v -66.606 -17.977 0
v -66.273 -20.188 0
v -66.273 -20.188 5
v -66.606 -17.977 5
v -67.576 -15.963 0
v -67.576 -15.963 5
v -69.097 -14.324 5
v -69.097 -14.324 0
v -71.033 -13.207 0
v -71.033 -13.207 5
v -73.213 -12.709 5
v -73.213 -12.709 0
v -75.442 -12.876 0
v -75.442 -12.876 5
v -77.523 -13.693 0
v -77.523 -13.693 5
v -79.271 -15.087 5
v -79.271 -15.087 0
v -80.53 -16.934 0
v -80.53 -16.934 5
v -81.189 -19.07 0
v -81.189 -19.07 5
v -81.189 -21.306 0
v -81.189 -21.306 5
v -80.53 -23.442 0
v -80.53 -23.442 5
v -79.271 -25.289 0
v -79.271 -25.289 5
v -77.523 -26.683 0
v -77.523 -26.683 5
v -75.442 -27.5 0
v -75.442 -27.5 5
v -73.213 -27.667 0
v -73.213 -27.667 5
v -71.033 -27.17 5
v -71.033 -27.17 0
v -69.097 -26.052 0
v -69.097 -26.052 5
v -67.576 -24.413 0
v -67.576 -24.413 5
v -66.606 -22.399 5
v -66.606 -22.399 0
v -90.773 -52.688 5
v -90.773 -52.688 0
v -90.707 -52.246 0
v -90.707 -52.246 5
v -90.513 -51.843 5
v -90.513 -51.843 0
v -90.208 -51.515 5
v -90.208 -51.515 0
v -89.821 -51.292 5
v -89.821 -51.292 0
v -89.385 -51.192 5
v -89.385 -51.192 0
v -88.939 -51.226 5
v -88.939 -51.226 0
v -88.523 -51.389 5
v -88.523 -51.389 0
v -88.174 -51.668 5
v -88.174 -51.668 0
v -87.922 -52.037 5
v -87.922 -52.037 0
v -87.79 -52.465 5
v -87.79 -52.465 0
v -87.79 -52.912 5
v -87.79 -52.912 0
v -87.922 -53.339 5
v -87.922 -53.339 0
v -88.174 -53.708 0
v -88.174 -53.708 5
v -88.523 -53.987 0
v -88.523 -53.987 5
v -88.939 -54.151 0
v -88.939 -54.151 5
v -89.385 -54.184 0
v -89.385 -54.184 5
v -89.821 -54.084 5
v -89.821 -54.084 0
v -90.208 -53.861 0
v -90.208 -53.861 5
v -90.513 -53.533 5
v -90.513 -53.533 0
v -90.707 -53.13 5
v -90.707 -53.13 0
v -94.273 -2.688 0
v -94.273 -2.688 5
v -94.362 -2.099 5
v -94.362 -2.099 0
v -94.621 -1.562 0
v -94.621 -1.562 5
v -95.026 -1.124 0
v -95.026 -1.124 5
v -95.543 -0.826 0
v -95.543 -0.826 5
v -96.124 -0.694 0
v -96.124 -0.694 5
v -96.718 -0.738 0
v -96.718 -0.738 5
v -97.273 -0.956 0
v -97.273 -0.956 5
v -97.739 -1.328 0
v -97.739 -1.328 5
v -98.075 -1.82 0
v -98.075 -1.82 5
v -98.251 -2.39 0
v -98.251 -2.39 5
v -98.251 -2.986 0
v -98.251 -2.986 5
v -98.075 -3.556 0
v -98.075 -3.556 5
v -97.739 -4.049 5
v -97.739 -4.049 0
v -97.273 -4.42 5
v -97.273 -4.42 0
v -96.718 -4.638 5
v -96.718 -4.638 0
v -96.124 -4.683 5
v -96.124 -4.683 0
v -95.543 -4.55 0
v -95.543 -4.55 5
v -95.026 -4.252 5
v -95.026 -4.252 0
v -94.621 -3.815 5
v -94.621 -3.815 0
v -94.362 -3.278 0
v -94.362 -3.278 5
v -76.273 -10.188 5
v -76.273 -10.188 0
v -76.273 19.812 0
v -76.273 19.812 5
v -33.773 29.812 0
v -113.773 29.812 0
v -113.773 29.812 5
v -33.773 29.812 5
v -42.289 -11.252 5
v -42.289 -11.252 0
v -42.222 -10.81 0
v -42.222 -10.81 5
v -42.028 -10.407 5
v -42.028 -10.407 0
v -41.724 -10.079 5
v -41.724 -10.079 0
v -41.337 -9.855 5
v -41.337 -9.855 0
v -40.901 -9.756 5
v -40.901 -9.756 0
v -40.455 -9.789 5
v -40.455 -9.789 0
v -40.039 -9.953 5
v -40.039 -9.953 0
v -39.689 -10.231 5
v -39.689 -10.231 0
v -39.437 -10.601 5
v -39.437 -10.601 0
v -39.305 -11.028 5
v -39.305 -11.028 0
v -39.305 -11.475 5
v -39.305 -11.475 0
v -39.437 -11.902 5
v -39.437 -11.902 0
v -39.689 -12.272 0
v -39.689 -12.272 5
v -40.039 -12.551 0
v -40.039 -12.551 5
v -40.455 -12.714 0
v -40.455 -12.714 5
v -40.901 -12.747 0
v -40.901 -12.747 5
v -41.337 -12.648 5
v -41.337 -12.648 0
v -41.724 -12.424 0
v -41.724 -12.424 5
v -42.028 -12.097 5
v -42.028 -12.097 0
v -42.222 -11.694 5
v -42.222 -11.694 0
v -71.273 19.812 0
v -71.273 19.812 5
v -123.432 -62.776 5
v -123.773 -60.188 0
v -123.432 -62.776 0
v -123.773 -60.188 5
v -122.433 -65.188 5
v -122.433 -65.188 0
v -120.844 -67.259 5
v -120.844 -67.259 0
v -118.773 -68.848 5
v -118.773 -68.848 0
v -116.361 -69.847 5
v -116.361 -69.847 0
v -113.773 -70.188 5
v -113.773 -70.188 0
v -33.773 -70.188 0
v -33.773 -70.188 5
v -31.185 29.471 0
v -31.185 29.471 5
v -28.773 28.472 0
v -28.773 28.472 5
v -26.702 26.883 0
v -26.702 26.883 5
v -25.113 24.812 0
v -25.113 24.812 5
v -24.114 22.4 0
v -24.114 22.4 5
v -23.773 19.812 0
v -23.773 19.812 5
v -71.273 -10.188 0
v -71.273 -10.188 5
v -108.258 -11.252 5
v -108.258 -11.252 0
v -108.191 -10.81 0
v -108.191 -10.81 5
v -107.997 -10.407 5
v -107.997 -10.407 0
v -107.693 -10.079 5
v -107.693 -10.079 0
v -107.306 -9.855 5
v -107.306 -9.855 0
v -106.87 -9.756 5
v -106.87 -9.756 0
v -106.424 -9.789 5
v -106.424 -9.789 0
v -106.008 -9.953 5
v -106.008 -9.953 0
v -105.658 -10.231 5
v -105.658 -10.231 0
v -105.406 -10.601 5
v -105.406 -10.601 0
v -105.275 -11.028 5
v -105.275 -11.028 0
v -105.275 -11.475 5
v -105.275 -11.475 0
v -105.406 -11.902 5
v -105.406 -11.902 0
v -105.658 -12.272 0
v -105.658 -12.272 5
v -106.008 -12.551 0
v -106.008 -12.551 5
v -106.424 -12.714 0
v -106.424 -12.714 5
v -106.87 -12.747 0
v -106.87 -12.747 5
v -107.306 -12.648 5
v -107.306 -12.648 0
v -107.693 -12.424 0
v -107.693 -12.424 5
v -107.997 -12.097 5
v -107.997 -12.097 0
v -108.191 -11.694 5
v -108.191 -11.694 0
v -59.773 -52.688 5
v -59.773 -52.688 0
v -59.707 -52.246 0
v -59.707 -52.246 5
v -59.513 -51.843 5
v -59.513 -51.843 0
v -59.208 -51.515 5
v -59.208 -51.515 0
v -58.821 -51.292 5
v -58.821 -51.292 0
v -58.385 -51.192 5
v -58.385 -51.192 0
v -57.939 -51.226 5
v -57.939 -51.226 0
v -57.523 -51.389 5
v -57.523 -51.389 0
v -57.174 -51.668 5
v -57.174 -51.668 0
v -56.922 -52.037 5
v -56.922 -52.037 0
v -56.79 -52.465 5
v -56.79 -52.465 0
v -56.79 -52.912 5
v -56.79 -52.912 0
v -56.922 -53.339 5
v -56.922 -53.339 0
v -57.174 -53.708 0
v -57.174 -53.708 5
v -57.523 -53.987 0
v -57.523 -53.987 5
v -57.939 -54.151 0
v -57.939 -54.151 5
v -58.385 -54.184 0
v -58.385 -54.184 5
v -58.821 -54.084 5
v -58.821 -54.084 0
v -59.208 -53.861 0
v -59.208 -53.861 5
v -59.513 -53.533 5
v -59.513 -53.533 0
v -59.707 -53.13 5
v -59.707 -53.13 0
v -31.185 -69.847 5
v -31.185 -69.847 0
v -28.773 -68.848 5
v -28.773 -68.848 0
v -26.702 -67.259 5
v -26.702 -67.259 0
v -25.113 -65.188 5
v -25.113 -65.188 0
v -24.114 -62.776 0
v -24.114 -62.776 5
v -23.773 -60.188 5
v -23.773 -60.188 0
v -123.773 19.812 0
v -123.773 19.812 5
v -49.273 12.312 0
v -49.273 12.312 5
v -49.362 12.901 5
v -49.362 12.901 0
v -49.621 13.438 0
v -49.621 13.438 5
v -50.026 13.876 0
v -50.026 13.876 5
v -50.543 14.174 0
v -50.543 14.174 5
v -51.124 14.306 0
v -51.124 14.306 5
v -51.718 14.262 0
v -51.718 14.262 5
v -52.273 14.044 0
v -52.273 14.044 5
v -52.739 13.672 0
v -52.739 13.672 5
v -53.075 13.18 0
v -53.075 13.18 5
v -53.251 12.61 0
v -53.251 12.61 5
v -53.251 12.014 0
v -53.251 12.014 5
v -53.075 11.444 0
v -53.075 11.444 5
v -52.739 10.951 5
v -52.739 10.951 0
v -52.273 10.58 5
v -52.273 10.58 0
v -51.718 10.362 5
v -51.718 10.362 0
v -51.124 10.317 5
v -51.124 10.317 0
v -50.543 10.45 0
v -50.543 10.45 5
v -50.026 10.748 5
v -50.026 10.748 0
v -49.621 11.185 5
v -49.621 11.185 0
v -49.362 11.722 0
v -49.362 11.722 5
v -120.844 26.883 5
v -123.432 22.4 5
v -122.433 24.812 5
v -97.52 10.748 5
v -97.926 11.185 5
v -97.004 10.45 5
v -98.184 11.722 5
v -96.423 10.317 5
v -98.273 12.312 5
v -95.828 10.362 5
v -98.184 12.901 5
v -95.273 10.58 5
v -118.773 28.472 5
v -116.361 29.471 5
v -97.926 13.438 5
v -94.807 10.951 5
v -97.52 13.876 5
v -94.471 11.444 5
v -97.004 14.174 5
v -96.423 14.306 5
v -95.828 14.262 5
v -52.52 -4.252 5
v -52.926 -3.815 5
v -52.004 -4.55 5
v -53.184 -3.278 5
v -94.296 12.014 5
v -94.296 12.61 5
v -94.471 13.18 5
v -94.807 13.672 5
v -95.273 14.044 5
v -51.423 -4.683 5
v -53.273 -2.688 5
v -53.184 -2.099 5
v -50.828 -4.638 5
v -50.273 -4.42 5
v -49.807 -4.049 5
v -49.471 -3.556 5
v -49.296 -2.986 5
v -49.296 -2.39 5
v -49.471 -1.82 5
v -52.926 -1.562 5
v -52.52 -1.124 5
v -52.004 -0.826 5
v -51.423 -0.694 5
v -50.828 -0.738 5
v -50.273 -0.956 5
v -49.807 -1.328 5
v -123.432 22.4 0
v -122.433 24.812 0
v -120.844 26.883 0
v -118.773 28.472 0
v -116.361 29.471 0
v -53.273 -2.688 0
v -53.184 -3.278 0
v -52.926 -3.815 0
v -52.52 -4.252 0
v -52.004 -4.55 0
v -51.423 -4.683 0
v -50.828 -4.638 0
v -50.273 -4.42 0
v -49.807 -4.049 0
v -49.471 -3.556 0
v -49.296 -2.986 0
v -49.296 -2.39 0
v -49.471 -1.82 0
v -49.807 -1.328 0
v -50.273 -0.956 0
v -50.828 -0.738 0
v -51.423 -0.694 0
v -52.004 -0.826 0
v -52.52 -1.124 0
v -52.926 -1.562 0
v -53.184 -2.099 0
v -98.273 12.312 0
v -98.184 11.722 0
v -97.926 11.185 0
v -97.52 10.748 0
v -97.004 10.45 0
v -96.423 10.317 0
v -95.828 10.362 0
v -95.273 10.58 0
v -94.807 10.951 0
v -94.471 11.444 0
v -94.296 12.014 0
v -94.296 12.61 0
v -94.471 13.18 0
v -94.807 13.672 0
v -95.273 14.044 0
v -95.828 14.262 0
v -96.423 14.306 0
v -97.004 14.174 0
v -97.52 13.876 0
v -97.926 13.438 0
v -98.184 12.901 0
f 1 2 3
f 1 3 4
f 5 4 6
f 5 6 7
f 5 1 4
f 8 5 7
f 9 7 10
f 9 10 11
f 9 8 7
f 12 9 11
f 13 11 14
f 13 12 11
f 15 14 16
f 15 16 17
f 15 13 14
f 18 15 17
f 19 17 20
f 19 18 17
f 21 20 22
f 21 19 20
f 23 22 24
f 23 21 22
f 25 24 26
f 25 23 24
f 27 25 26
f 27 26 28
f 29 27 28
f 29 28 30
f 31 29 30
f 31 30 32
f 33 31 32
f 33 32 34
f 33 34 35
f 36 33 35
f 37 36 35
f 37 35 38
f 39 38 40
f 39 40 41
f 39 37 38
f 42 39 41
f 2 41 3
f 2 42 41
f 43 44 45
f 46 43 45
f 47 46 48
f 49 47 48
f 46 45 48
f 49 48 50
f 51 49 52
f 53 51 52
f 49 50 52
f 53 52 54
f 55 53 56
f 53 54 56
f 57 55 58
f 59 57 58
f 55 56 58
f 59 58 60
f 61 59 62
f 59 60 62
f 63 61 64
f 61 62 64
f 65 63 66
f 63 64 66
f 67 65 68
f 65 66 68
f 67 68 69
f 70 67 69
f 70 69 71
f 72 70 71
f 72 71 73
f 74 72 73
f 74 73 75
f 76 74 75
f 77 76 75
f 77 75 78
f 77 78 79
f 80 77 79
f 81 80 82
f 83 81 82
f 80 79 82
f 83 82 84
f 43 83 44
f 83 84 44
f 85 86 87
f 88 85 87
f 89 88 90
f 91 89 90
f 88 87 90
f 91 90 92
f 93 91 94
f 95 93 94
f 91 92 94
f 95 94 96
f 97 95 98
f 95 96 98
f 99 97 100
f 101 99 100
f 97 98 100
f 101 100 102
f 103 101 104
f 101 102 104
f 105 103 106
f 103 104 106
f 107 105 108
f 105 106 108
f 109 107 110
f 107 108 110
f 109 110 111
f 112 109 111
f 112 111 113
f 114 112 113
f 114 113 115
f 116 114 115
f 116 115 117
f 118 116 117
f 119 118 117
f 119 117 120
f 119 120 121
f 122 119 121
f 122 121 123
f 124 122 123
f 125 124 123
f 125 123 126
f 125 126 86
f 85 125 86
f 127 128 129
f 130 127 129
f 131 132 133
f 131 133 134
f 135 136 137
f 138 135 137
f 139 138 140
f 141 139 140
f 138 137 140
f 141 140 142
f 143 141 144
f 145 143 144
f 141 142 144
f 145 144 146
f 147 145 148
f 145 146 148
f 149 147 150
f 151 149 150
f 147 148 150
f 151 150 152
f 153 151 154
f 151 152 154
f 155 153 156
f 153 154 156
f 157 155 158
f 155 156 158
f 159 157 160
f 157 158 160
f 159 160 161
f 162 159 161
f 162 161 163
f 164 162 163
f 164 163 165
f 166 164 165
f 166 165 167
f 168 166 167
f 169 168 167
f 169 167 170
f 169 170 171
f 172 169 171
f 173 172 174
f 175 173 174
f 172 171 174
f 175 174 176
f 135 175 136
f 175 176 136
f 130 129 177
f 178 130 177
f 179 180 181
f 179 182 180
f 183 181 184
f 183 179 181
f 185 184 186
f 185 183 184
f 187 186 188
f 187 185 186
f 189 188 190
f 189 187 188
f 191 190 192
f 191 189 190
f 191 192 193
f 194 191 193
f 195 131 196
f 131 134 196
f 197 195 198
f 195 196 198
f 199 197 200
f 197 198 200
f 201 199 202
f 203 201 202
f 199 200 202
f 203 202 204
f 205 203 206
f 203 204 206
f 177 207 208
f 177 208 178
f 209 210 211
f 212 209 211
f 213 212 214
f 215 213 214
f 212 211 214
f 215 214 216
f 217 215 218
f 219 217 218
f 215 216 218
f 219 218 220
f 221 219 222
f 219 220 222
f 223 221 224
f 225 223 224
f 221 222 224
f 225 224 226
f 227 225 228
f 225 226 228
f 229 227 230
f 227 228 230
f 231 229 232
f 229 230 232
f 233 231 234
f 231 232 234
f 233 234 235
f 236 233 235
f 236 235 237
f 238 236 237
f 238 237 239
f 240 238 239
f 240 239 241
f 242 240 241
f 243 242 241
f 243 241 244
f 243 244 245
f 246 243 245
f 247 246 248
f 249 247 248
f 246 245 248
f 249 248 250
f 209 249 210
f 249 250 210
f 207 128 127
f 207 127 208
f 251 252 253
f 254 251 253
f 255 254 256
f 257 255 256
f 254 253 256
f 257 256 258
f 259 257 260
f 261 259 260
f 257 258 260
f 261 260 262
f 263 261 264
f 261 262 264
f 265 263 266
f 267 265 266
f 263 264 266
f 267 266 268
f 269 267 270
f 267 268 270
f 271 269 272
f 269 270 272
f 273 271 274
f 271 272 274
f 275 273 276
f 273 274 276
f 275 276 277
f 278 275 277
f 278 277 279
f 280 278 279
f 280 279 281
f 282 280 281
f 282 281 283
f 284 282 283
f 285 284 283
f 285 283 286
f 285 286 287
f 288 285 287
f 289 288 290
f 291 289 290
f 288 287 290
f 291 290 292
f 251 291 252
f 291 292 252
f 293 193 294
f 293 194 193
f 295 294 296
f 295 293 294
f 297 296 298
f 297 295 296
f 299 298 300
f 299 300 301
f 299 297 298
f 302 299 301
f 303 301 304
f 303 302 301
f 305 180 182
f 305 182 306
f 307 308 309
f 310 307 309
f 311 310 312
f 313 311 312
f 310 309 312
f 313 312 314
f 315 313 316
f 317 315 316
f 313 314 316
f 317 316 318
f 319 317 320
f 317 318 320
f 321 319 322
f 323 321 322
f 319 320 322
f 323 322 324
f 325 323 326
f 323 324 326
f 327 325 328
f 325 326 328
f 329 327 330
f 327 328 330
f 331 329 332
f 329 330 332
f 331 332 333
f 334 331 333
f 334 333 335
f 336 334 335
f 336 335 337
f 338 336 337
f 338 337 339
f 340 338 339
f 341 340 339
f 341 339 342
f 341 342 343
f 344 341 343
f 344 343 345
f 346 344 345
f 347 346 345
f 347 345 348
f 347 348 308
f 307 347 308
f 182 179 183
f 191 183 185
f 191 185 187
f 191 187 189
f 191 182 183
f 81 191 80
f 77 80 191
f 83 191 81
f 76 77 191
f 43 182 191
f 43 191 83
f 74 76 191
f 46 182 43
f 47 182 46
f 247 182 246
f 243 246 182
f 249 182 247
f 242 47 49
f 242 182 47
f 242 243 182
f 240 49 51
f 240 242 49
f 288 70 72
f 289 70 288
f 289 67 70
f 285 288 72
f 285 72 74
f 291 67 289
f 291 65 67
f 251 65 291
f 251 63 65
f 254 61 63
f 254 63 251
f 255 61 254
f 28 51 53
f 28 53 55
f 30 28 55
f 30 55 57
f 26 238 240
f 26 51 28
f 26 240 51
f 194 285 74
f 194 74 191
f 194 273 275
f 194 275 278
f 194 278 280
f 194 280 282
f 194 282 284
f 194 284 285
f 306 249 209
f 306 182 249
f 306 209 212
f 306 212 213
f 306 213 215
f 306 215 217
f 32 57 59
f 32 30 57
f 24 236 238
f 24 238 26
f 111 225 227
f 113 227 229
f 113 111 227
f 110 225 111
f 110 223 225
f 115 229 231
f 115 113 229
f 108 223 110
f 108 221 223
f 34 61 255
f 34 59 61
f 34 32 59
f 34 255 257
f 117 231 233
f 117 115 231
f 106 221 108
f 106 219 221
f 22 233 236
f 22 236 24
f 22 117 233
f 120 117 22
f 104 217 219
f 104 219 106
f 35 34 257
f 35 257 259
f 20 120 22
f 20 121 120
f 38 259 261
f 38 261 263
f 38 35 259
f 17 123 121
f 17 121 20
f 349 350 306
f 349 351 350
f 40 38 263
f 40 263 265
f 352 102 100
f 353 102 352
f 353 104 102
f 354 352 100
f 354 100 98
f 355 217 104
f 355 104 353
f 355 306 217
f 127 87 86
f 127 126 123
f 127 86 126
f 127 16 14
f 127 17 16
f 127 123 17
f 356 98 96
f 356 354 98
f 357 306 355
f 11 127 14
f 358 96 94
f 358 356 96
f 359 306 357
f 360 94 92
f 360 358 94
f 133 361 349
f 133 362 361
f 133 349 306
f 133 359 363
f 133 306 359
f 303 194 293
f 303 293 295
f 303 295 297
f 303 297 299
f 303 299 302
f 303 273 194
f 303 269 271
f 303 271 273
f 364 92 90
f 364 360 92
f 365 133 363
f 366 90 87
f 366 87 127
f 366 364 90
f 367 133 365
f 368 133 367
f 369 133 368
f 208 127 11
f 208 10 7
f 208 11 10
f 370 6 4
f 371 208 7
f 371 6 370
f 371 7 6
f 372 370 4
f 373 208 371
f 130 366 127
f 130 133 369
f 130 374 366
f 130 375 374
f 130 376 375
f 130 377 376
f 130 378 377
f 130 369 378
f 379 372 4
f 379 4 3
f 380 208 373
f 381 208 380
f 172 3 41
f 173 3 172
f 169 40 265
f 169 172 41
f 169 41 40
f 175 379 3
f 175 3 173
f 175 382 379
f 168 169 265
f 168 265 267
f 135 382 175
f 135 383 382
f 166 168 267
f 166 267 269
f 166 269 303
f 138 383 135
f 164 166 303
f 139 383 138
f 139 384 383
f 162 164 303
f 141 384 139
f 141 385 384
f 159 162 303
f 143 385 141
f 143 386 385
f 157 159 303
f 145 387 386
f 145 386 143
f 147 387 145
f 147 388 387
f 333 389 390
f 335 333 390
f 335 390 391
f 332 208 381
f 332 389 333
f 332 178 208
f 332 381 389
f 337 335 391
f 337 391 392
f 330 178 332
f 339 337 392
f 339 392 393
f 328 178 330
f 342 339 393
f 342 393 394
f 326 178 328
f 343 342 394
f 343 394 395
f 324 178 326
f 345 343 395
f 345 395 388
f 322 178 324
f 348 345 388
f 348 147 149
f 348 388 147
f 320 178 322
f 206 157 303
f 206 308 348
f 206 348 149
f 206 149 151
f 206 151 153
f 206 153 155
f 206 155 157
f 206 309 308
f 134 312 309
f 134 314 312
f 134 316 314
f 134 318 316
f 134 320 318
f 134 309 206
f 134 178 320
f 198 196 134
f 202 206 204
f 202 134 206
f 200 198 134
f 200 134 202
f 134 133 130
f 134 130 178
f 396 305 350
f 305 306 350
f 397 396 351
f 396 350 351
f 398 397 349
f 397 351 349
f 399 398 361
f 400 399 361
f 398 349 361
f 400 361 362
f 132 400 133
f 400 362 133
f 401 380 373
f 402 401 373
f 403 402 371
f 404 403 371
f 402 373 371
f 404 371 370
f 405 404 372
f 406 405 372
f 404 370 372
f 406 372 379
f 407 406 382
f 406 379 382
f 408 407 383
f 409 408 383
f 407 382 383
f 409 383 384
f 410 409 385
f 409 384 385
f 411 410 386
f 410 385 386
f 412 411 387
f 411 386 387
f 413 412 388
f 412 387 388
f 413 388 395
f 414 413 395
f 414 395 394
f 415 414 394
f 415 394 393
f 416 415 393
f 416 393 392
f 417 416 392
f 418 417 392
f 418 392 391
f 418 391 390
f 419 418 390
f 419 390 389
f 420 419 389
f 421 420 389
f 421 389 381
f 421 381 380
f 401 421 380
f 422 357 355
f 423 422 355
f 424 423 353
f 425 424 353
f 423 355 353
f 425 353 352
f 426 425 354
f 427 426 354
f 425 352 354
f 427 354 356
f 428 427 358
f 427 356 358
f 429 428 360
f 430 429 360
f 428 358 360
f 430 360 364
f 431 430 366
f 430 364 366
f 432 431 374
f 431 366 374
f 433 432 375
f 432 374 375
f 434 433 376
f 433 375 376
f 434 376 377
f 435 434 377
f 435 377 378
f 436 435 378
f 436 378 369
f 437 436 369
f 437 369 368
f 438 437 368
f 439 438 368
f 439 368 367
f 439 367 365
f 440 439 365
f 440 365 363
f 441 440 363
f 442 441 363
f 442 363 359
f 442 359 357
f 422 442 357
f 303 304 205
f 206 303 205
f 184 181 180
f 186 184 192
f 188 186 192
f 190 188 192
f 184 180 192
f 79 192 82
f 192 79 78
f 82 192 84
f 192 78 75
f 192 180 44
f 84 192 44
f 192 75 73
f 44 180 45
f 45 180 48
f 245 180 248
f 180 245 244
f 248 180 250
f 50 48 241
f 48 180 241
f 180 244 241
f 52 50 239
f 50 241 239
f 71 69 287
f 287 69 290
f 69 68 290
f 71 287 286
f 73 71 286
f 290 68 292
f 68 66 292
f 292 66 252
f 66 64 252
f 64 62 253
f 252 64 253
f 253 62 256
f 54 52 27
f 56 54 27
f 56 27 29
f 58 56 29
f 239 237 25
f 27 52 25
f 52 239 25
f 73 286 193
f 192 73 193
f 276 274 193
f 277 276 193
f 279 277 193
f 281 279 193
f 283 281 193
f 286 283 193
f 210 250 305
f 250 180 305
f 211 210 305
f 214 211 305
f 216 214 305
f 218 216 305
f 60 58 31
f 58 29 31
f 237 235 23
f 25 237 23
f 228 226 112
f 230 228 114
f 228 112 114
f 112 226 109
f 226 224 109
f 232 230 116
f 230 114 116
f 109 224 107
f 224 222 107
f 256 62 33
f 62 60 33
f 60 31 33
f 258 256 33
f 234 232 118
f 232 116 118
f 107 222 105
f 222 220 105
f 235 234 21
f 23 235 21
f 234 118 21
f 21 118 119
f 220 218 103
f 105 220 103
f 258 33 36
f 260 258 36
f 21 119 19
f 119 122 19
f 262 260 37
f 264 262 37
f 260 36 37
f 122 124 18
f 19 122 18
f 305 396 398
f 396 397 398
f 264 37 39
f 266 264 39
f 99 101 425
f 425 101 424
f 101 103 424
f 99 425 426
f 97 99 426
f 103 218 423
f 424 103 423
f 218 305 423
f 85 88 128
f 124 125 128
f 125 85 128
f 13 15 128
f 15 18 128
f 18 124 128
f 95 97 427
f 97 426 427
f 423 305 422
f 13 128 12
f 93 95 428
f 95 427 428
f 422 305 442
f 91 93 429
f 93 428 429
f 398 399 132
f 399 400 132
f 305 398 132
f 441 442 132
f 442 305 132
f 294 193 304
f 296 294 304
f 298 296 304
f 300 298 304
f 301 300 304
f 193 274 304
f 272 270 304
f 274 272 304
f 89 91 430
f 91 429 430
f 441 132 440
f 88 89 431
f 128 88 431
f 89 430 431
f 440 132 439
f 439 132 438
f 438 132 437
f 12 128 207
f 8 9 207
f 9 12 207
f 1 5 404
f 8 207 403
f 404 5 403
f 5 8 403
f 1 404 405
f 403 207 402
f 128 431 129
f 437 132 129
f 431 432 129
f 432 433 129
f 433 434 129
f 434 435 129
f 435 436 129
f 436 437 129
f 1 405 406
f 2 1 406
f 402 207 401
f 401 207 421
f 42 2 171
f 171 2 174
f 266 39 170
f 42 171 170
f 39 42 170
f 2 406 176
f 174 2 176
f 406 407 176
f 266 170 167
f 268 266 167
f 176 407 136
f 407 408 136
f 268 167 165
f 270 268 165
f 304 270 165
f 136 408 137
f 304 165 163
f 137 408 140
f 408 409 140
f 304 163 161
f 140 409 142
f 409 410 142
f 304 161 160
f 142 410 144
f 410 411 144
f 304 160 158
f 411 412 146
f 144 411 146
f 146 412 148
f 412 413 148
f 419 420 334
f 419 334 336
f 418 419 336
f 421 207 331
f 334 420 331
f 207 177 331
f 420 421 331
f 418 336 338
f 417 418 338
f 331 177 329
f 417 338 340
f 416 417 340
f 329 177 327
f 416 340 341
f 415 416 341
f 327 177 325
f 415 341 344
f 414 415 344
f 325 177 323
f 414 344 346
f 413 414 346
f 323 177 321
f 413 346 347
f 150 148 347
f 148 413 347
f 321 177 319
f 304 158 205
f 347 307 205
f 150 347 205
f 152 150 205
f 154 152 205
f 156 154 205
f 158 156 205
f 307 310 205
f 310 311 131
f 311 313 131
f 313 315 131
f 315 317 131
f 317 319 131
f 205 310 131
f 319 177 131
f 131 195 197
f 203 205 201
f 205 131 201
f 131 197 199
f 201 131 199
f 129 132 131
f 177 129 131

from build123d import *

# Parameters (mm, degrees)
CROQUIS1_W              = 100
CROQUIS1_H              = 100
CROQUIS1_R              = 7.5
CROQUIS1_W_2            = 5
CROQUIS1_H_2            = 30
SALIENTE_EXTRUIR1_DEPTH = 5
REDONDEO1_R             = 10
CROQUIS3_R              = 1.5
CROQUIS3_R_2            = 1.500000006
CORTAR_EXTRUIR1_DEPTH   = 5
CORTAR_EXTRUIR2_REACH   = 144.377
CROQUIS4_R              = 2


with BuildPart() as part:
    # Croquis1 → Saliente-Extruir1 (new body)
    with BuildSketch(Plane.XY):
        with Locations((-73.773233416, -20.188160544)):
            Rectangle(CROQUIS1_W, CROQUIS1_H)
        with Locations((-73.773233416, -20.188160544)):
            Circle(CROQUIS1_R, mode=Mode.SUBTRACT)
        with Locations((-73.773233416, 4.811839456)):
            Rectangle(CROQUIS1_W_2, CROQUIS1_H_2, mode=Mode.SUBTRACT)
    extrude(amount=SALIENTE_EXTRUIR1_DEPTH)

    # Redondeo1
    redondeo1_edges = [part.edges().sort_by_distance(p)[0] for p in [
        (-23.773233416, 29.811839456, 2.5),
        (-23.773233416, -70.188160544, 2.5),
        (-123.773233416, -70.188160544, 2.5),
        (-123.773233416, 29.811839456, 2.5),
    ]]
    fillet(redondeo1_edges, radius=REDONDEO1_R)

    # Croquis3 → Cortar-Extruir1 (cut)
    with BuildSketch(Plane(origin=(0, 0, 0), x_dir=(-1, 0, 0), z_dir=(0, 0, -1))):
        with Locations((106.757827558, -11.251647632)):
            Circle(CROQUIS3_R)
        with Locations((40.788639233, -11.251647632)):
            Circle(CROQUIS3_R_2)
        with Locations((89.273233395, -52.688161005)):
            Circle(CROQUIS3_R)
        with Locations((58.273233395, -52.688161005)):
            Circle(CROQUIS3_R)
    extrude(amount=-CORTAR_EXTRUIR1_DEPTH, mode=Mode.SUBTRACT)

    # Croquis4 → Cortar-Extruir2 (cut, up to next)
    with BuildSketch(Plane.XY.offset(5), mode=Mode.PRIVATE) as cortar_extruir2_sk1:
        with Locations((-51.273233416, 12.311839456)):
            Circle(CROQUIS4_R)
    cortar_extruir2_tool1 = extrude(cortar_extruir2_sk1.sketch, amount=-CORTAR_EXTRUIR2_REACH, mode=Mode.PRIVATE) & part.part
    # Croquis4 → Cortar-Extruir2 (cut, up to next)
    with BuildSketch(Plane.XY.offset(5), mode=Mode.PRIVATE) as cortar_extruir2_sk2:
        with Locations(Location((-96.273233416, 12.311839456, 0), (0, 0, 180))):
            Circle(CROQUIS4_R)
    cortar_extruir2_tool2 = extrude(cortar_extruir2_sk2.sketch, amount=-CORTAR_EXTRUIR2_REACH, mode=Mode.PRIVATE) & part.part
    # Croquis4 → Cortar-Extruir2 (cut, up to next)
    with BuildSketch(Plane.XY.offset(5), mode=Mode.PRIVATE) as cortar_extruir2_sk3:
        with Locations((-96.273233416, -2.688160544)):
            Circle(CROQUIS4_R)
    cortar_extruir2_tool3 = extrude(cortar_extruir2_sk3.sketch, amount=-CORTAR_EXTRUIR2_REACH, mode=Mode.PRIVATE) & part.part
    # Croquis4 → Cortar-Extruir2 (cut, up to next)
    with BuildSketch(Plane.XY.offset(5), mode=Mode.PRIVATE) as cortar_extruir2_sk4:
        with Locations(Location((-51.273233416, -2.688160544, 0), (0, 0, 180))):
            Circle(CROQUIS4_R)
    cortar_extruir2_tool4 = extrude(cortar_extruir2_sk4.sketch, amount=-CORTAR_EXTRUIR2_REACH, mode=Mode.PRIVATE) & part.part
    add(cortar_extruir2_tool1.solids().sort_by_distance((-51.273233, 12.311839, 5))[0], mode=Mode.SUBTRACT)
    add(cortar_extruir2_tool2.solids().sort_by_distance((-96.273233, 12.311839, 5))[0], mode=Mode.SUBTRACT)
    add(cortar_extruir2_tool3.solids().sort_by_distance((-96.273233, -2.688161, 5))[0], mode=Mode.SUBTRACT)
    add(cortar_extruir2_tool4.solids().sort_by_distance((-51.273233, -2.688161, 5))[0], mode=Mode.SUBTRACT)


solid = part.part
